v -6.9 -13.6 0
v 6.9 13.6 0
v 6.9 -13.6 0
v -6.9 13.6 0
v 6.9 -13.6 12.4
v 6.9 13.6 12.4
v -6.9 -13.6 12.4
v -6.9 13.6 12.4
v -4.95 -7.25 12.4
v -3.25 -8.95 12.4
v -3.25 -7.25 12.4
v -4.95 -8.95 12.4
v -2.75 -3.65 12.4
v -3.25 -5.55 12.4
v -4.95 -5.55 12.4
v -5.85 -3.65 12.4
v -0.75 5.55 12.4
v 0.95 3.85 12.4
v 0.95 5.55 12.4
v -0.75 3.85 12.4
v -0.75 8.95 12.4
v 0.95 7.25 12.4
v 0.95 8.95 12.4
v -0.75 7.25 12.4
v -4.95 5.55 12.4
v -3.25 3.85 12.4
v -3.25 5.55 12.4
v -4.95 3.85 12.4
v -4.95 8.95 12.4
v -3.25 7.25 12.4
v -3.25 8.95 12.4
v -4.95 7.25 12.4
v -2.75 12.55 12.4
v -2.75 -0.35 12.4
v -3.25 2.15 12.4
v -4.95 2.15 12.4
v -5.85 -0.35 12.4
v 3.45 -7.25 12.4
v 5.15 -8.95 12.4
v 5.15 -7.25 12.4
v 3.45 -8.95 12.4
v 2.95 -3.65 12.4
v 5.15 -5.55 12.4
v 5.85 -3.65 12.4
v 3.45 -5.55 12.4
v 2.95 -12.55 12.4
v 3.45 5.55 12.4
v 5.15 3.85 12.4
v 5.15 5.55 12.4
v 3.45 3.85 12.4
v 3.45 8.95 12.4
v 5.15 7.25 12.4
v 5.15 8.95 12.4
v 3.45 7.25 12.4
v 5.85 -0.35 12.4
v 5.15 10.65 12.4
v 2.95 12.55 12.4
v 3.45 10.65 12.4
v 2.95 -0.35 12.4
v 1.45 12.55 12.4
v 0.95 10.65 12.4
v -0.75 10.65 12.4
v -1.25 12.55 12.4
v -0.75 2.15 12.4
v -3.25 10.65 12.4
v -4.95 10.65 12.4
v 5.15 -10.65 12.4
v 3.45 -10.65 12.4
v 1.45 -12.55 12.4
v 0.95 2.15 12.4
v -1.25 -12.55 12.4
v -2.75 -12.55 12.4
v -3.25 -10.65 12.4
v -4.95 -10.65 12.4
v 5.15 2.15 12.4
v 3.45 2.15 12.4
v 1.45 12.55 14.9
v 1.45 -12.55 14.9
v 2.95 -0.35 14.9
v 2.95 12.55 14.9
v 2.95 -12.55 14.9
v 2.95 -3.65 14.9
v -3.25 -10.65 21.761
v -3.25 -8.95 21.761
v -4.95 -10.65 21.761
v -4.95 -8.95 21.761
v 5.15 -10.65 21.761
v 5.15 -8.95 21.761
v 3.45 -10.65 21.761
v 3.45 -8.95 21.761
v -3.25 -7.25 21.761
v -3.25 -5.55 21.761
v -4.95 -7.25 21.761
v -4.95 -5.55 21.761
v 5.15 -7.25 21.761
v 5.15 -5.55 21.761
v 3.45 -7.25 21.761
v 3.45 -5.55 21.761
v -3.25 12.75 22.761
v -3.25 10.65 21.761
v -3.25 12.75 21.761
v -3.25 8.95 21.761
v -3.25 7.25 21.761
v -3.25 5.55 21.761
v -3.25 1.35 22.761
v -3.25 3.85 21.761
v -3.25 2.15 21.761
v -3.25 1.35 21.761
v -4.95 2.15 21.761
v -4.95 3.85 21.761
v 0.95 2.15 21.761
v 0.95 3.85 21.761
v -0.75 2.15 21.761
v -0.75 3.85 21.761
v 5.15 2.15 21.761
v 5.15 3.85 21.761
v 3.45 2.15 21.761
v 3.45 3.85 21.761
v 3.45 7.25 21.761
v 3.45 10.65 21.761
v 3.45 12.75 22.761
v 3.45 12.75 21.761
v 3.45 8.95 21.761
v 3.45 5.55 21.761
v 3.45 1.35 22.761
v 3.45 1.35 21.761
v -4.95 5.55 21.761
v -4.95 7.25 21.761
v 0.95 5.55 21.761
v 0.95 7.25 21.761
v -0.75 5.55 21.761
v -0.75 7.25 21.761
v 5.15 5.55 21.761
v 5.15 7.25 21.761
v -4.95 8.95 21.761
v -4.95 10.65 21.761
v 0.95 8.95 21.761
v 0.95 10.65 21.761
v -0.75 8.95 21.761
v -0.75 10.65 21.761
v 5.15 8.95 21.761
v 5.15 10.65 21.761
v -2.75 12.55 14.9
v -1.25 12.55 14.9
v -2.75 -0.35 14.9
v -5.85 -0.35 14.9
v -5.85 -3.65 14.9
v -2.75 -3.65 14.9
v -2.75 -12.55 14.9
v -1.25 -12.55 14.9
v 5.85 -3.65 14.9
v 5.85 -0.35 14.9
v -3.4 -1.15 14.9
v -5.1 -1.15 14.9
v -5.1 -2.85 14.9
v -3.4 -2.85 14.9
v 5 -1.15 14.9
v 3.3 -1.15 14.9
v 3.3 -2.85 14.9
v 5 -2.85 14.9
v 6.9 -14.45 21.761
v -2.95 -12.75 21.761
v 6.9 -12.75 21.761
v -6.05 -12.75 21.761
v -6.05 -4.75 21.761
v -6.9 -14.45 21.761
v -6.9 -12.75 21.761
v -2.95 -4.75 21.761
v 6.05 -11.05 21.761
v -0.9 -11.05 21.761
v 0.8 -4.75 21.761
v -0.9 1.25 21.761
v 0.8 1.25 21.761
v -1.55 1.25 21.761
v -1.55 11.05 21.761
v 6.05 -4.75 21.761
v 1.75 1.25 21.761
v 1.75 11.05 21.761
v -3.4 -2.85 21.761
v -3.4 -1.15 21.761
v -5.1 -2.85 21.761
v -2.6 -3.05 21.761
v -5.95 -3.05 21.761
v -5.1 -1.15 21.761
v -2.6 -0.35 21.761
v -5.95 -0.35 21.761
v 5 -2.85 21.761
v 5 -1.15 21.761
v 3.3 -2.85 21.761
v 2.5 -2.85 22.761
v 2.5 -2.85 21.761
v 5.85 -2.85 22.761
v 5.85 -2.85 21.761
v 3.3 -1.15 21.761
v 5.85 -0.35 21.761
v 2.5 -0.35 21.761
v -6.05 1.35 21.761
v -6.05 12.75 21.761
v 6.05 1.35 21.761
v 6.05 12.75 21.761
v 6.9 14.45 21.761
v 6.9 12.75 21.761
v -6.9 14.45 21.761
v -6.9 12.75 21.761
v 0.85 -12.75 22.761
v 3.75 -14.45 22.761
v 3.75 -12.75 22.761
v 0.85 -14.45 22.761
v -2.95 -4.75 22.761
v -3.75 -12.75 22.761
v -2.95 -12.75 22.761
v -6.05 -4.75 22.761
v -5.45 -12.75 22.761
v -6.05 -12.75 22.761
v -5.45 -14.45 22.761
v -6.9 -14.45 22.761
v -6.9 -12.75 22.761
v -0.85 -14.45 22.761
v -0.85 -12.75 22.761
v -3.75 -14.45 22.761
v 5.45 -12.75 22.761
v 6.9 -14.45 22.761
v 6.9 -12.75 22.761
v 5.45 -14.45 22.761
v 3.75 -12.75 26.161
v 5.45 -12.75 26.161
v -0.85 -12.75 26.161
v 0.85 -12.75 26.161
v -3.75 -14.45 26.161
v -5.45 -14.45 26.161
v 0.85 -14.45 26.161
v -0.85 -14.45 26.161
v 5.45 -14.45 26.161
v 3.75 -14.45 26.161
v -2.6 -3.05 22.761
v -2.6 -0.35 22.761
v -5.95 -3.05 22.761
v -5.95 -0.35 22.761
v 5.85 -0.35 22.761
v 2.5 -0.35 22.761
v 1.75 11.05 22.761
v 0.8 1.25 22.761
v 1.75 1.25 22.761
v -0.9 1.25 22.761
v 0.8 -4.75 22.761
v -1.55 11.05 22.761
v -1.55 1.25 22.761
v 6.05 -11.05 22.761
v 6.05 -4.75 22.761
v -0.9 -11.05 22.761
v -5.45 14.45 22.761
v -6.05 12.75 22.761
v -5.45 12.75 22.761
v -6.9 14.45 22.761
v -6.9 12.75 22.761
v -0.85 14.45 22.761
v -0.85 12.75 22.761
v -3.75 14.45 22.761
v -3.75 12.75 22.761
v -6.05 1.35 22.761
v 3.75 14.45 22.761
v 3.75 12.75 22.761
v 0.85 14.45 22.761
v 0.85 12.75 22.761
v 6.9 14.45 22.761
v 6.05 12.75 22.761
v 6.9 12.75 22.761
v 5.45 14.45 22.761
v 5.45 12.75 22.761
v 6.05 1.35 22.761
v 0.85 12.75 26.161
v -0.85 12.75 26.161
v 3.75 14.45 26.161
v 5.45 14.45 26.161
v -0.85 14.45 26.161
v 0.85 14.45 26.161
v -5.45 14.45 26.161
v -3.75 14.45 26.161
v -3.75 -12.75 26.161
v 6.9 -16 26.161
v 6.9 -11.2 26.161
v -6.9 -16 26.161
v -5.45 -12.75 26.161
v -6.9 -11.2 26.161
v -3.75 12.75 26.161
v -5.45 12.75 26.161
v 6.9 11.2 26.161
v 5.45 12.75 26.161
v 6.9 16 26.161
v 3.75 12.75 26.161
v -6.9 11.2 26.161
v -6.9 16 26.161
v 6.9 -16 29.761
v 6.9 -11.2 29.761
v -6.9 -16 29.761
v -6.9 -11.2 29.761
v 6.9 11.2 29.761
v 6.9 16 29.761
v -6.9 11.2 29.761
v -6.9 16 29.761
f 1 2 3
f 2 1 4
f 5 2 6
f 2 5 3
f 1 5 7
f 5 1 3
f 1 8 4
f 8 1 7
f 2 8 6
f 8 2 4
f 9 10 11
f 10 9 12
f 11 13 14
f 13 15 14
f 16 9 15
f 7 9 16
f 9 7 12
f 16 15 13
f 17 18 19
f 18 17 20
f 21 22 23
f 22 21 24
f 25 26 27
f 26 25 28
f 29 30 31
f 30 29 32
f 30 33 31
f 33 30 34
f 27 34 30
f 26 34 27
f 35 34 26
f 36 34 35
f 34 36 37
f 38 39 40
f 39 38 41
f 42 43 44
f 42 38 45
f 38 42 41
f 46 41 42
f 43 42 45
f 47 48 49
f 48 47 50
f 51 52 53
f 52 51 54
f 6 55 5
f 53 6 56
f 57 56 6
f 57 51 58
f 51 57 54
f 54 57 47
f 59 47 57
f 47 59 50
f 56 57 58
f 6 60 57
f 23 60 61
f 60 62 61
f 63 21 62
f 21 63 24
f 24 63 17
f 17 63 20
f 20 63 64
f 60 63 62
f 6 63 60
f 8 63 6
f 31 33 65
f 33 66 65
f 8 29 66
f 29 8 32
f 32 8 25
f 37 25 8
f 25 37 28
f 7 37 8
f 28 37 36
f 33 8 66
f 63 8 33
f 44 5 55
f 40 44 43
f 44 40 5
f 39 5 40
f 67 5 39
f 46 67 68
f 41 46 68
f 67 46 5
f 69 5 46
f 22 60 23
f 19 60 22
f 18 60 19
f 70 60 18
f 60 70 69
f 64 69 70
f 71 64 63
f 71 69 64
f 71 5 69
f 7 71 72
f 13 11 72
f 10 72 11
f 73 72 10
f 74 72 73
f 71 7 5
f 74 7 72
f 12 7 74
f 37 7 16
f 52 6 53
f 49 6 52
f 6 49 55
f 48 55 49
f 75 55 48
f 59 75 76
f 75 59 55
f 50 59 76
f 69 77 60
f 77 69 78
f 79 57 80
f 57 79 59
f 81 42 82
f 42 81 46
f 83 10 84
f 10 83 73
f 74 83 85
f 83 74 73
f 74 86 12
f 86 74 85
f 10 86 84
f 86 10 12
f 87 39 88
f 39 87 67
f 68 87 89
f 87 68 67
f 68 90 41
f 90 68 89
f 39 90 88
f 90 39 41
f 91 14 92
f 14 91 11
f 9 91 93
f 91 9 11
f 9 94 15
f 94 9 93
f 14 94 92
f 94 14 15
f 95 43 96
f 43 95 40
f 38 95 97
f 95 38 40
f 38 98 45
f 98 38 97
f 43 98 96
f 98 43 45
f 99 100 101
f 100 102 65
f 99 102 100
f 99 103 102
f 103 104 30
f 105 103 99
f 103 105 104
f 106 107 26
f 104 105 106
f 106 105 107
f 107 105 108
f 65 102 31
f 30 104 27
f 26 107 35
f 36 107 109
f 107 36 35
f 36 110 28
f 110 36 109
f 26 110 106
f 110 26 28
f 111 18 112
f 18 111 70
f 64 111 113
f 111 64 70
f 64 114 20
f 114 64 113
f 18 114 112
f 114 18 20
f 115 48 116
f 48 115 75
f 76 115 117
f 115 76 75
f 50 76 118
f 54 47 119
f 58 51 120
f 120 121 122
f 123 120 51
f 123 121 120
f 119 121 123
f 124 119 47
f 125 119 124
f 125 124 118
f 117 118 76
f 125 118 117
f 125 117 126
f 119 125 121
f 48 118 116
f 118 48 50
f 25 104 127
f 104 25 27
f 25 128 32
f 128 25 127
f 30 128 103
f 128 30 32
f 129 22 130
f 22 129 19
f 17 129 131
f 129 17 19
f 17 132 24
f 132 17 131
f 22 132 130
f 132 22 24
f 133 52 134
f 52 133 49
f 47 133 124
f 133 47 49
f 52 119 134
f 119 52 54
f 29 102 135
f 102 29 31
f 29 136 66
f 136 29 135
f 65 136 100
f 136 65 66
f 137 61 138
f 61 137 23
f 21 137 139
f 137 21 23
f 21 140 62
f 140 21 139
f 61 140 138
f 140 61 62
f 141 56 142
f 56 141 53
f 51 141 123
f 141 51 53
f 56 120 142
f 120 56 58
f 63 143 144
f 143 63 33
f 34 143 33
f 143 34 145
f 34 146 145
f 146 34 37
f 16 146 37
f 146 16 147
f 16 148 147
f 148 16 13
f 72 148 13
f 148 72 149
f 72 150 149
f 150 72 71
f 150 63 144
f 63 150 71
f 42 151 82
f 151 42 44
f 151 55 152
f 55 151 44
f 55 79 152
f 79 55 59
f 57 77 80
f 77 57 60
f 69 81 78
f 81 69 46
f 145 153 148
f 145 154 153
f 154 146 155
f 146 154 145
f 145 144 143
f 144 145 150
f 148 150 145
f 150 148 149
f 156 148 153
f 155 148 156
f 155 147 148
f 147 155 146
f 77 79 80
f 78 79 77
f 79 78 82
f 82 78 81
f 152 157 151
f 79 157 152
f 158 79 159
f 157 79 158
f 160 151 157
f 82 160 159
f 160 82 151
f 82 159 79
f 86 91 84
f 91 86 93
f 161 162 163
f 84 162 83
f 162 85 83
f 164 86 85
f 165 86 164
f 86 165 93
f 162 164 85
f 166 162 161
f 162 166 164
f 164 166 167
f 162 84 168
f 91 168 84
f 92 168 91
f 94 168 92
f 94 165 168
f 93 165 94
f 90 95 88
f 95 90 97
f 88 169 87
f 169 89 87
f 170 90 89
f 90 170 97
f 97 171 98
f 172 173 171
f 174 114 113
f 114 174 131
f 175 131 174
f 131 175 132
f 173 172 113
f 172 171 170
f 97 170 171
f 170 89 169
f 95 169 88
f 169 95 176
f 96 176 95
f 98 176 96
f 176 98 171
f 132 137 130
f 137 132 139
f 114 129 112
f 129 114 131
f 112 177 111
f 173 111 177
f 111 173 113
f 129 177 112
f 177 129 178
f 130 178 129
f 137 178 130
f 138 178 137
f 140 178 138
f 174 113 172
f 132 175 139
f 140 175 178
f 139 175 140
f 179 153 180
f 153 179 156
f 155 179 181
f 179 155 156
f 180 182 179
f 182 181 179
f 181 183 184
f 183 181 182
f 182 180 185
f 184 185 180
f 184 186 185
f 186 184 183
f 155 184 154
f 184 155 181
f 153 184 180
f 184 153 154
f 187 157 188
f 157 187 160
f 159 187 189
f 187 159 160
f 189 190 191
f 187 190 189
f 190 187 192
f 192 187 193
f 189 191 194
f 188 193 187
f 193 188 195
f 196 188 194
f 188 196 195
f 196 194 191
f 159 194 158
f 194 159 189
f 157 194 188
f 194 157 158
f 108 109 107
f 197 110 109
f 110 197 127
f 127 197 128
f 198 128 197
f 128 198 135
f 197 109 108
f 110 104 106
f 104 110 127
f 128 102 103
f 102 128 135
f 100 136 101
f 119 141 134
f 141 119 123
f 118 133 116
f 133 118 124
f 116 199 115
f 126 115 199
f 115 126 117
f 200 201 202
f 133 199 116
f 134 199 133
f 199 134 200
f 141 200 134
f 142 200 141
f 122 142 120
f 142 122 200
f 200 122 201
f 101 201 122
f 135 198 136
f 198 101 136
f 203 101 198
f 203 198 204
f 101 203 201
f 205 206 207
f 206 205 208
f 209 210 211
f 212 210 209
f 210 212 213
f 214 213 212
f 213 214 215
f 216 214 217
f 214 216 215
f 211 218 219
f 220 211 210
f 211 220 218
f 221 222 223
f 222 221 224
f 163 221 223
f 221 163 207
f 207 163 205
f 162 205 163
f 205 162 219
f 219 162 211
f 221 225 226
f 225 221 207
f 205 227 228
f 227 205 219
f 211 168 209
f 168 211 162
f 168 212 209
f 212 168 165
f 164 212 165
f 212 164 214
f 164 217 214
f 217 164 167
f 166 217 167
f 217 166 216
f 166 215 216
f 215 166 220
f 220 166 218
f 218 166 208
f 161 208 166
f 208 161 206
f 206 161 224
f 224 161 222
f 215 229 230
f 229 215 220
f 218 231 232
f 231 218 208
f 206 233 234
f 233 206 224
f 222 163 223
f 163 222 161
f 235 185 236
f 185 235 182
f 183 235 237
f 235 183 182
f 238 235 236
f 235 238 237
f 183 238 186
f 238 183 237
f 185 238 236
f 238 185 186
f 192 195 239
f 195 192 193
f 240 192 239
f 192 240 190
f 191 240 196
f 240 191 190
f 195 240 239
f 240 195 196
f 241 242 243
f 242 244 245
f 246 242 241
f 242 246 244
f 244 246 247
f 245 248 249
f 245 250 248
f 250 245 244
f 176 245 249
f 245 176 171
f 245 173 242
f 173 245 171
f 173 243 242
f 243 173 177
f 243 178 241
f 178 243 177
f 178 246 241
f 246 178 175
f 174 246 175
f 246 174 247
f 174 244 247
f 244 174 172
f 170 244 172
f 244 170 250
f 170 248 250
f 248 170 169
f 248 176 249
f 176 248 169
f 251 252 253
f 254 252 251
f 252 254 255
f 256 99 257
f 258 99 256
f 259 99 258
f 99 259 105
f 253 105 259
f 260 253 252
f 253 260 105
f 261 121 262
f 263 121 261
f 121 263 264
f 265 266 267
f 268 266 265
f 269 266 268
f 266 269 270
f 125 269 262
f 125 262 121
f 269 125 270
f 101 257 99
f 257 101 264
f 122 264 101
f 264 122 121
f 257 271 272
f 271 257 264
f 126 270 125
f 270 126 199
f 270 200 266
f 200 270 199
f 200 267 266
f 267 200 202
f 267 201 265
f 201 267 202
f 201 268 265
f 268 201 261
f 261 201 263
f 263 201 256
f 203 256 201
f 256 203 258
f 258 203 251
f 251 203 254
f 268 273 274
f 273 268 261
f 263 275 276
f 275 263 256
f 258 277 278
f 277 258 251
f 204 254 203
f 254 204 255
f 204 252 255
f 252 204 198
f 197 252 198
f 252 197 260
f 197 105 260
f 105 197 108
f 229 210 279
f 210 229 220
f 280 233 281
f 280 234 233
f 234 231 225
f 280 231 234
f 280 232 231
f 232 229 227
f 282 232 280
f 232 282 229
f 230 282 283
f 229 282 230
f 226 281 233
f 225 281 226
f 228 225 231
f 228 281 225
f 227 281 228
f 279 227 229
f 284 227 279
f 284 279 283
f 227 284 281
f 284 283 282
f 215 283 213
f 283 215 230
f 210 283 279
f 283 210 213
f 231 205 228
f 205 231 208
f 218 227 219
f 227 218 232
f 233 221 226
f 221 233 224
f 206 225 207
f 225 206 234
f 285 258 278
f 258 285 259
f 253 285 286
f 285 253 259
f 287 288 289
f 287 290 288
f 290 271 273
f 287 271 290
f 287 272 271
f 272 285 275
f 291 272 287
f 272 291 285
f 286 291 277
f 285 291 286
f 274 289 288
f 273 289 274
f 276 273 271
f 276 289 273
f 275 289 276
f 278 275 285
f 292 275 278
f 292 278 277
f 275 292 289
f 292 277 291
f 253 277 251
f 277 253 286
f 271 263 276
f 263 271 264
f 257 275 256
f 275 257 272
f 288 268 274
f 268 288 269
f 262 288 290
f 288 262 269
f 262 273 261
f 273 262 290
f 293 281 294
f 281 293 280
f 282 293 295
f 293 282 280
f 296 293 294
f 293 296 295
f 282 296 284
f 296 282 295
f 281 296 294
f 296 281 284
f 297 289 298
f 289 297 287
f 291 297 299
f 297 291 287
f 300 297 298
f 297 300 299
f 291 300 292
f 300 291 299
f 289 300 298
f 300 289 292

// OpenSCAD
// Generated by SolidPython 0.4.2 on 2020-09-29 23:21:21
//!OpenSCAD

scale(v = 0.0100000000) {
	translate(v = [-690, -1360, 0]) {
		union() {
			color(c = [0.4000000000, 0.4000000000, 0.4000000000]) {
				translate(v = [0, 0, 0]) {
					linear_extrude(height = 1000.0000000000) {
						polygon(paths = [[0, 1, 2, 3]], points = [[0, 0], [0, 2720], [1380, 2720], [1380, 0]]);
					}
				}
			}
			color(c = [0.2000000000, 0.6000000000, 0.2000000000]) {
				translate(v = [0, 0, 1000.0000000000]) {
					linear_extrude(height = 120.0000000000) {
						polygon(paths = [[0, 1, 2, 3]], points = [[0, 1305], [0, 2720], [1380, 2720], [1380, 1305]]);
					}
				}
			}
			color(c = [0.4000000000, 0.4000000000, 0.4000000000]) {
				translate(v = [0, 0, 1000.0000000000]) {
					linear_extrude(height = 120.0000000000) {
						polygon(paths = [[0, 1, 2, 3]], points = [[0, 0], [0, 1305], [1380, 1305], [1380, 0]]);
					}
				}
			}
			color(c = [0.9000000000, 0.6000000000, 0.6000000000]) {
				translate(v = [0, 0, 1120.0000000000]) {
					linear_extrude(height = 120.0000000000) {
						polygon(paths = [[0, 1, 2, 3]], points = [[155, 1485], [155, 2485], [415, 2485], [415, 1485]]);
					}
				}
			}
			color(c = [0.9000000000, 0.6000000000, 0.6000000000]) {
				translate(v = [0, 0, 1120.0000000000]) {
					linear_extrude(height = 120.0000000000) {
						polygon(paths = [[0, 1, 2, 3]], points = [[565, 1485], [565, 2485], [835, 2485], [835, 1485]]);
					}
				}
			}
			color(c = [0.9000000000, 0.6000000000, 0.6000000000]) {
				translate(v = [0, 0, 1120.0000000000]) {
					linear_extrude(height = 120.0000000000) {
						polygon(paths = [[0, 1, 2, 3]], points = [[985, 1485], [985, 2485], [1245, 2485], [1245, 1485]]);
					}
				}
			}
			color(c = [0.9000000000, 0.6000000000, 0.9000000000]) {
				translate(v = [0, 0, 1120.0000000000]) {
					linear_extrude(height = 120.0000000000) {
						polygon(paths = [[0, 1, 2, 3]], points = [[155, 235], [155, 885], [415, 885], [415, 235]]);
					}
				}
			}
			color(c = [0.9000000000, 0.6000000000, 0.9000000000]) {
				translate(v = [0, 0, 1120.0000000000]) {
					linear_extrude(height = 120.0000000000) {
						polygon(paths = [[0, 1, 2, 3]], points = [[565, 235], [565, 885], [835, 885], [835, 235]]);
					}
				}
			}
			color(c = [0.9000000000, 0.6000000000, 0.9000000000]) {
				translate(v = [0, 0, 1120.0000000000]) {
					linear_extrude(height = 120.0000000000) {
						polygon(paths = [[0, 1, 2, 3]], points = [[985, 235], [985, 885], [1245, 885], [1245, 235]]);
					}
				}
			}
			color(c = [0.2000000000, 0.6000000000, 0.2000000000]) {
				translate(v = [0, 0, 1120.0000000000]) {
					linear_extrude(height = 120.0000000000) {
						difference() {
							polygon(paths = [[0, 1, 2, 3]], points = [[0, 1305], [0, 2720], [1380, 2720], [1380, 1305]]);
							polygon(paths = [[0, 1, 2, 3]], points = [[155, 1485], [415, 1485], [415, 2485], [155, 2485]]);
							polygon(paths = [[0, 1, 2, 3]], points = [[565, 1485], [835, 1485], [835, 2485], [565, 2485]]);
							polygon(paths = [[0, 1, 2, 3]], points = [[985, 1485], [1245, 1485], [1245, 2485], [985, 2485]]);
						}
					}
				}
			}
			color(c = [0.4000000000, 0.4000000000, 0.4000000000]) {
				translate(v = [0, 0, 1120.0000000000]) {
					linear_extrude(height = 120.0000000000) {
						difference() {
							polygon(paths = [[0, 1, 2, 3]], points = [[0, 0], [0, 1305], [1380, 1305], [1380, 0]]);
							polygon(paths = [[0, 1, 2, 3]], points = [[155, 235], [415, 235], [415, 885], [155, 885]]);
							polygon(paths = [[0, 1, 2, 3]], points = [[565, 235], [835, 235], [835, 885], [565, 885]]);
							polygon(paths = [[0, 1, 2, 3]], points = [[985, 235], [1245, 235], [1245, 885], [985, 885]]);
						}
					}
				}
			}
			color(c = [0.1000000000, 0.1000000000, 0.1000000000]) {
				translate(v = [0, 0, 1240.0000000000]) {
					linear_extrude(height = 70.0000000000) {
						polygon(paths = [[0, 1, 2, 3]], points = [[195, 295], [195, 465], [365, 465], [365, 295]]);
					}
				}
			}
			color(c = [0.1000000000, 0.1000000000, 0.1000000000]) {
				translate(v = [0, 0, 1240.0000000000]) {
					linear_extrude(height = 70.0000000000) {
						polygon(paths = [[0, 1, 2, 3]], points = [[1035, 295], [1035, 465], [1205, 465], [1205, 295]]);
					}
				}
			}
			color(c = [0.1000000000, 0.1000000000, 0.1000000000]) {
				translate(v = [0, 0, 1240.0000000000]) {
					linear_extrude(height = 70.0000000000) {
						polygon(paths = [[0, 1, 2, 3]], points = [[195, 635], [195, 805], [365, 805], [365, 635]]);
					}
				}
			}
			color(c = [0.1000000000, 0.1000000000, 0.1000000000]) {
				translate(v = [0, 0, 1240.0000000000]) {
					linear_extrude(height = 70.0000000000) {
						polygon(paths = [[0, 1, 2, 3]], points = [[1035, 635], [1035, 805], [1205, 805], [1205, 635]]);
					}
				}
			}
			color(c = [0.1000000000, 0.1000000000, 0.1000000000]) {
				translate(v = [0, 0, 1240.0000000000]) {
					linear_extrude(height = 70.0000000000) {
						polygon(paths = [[0, 1, 2, 3]], points = [[195, 1575], [195, 1745], [365, 1745], [365, 1575]]);
					}
				}
			}
			color(c = [0.1000000000, 0.1000000000, 0.1000000000]) {
				translate(v = [0, 0, 1240.0000000000]) {
					linear_extrude(height = 70.0000000000) {
						polygon(paths = [[0, 1, 2, 3]], points = [[615, 1575], [615, 1745], [785, 1745], [785, 1575]]);
					}
				}
			}
			color(c = [0.1000000000, 0.1000000000, 0.1000000000]) {
				translate(v = [0, 0, 1240.0000000000]) {
					linear_extrude(height = 70.0000000000) {
						polygon(paths = [[0, 1, 2, 3]], points = [[1035, 1575], [1035, 1745], [1205, 1745], [1205, 1575]]);
					}
				}
			}
			color(c = [0.1000000000, 0.1000000000, 0.1000000000]) {
				translate(v = [0, 0, 1240.0000000000]) {
					linear_extrude(height = 70.0000000000) {
						polygon(paths = [[0, 1, 2, 3]], points = [[195, 1915], [195, 2085], [365, 2085], [365, 1915]]);
					}
				}
			}
			color(c = [0.1000000000, 0.1000000000, 0.1000000000]) {
				translate(v = [0, 0, 1240.0000000000]) {
					linear_extrude(height = 70.0000000000) {
						polygon(paths = [[0, 1, 2, 3]], points = [[615, 1915], [615, 2085], [785, 2085], [785, 1915]]);
					}
				}
			}
			color(c = [0.1000000000, 0.1000000000, 0.1000000000]) {
				translate(v = [0, 0, 1240.0000000000]) {
					linear_extrude(height = 70.0000000000) {
						polygon(paths = [[0, 1, 2, 3]], points = [[1035, 1915], [1035, 2085], [1205, 2085], [1205, 1915]]);
					}
				}
			}
			color(c = [0.1000000000, 0.1000000000, 0.1000000000]) {
				translate(v = [0, 0, 1240.0000000000]) {
					linear_extrude(height = 70.0000000000) {
						polygon(paths = [[0, 1, 2, 3]], points = [[195, 2255], [195, 2425], [365, 2425], [365, 2255]]);
					}
				}
			}
			color(c = [0.1000000000, 0.1000000000, 0.1000000000]) {
				translate(v = [0, 0, 1240.0000000000]) {
					linear_extrude(height = 70.0000000000) {
						polygon(paths = [[0, 1, 2, 3]], points = [[615, 2255], [615, 2425], [785, 2425], [785, 2255]]);
					}
				}
			}
			color(c = [0.1000000000, 0.1000000000, 0.1000000000]) {
				translate(v = [0, 0, 1240.0000000000]) {
					linear_extrude(height = 70.0000000000) {
						polygon(paths = [[0, 1, 2, 3]], points = [[1035, 2255], [1035, 2425], [1205, 2425], [1205, 2255]]);
					}
				}
			}
			color(c = [1.0000000000, 1.0000000000, 1.0000000000]) {
				translate(v = [0, 0, 1240.0000000000]) {
					linear_extrude(height = 70.0000000000) {
						polygon(paths = [[0, 1, 2, 3, 4, 5, 6, 7]], points = [[415, 105], [415, 995], [105, 995], [105, 1325], [415, 1325], [415, 2615], [565, 2615], [565, 105]]);
					}
				}
			}
			color(c = [1.0000000000, 1.0000000000, 1.0000000000]) {
				translate(v = [0, 0, 1240.0000000000]) {
					linear_extrude(height = 70.0000000000) {
						polygon(paths = [[0, 1, 2, 3, 4, 5, 6, 7]], points = [[835, 105], [835, 2615], [985, 2615], [985, 1325], [1275, 1325], [1275, 995], [985, 995], [985, 105]]);
					}
				}
			}
			color(c = [0.1000000000, 0.1000000000, 0.1000000000]) {
				translate(v = [0, 0, 1310.0000000000]) {
					linear_extrude(height = 180.0000000000) {
						polygon(paths = [[0, 1, 2, 3]], points = [[195, 295], [195, 465], [365, 465], [365, 295]]);
					}
				}
			}
			color(c = [0.1000000000, 0.1000000000, 0.1000000000]) {
				translate(v = [0, 0, 1310.0000000000]) {
					linear_extrude(height = 180.0000000000) {
						polygon(paths = [[0, 1, 2, 3]], points = [[1035, 295], [1035, 465], [1205, 465], [1205, 295]]);
					}
				}
			}
			color(c = [0.1000000000, 0.1000000000, 0.1000000000]) {
				translate(v = [0, 0, 1310.0000000000]) {
					linear_extrude(height = 180.0000000000) {
						polygon(paths = [[0, 1, 2, 3]], points = [[195, 635], [195, 805], [365, 805], [365, 635]]);
					}
				}
			}
			color(c = [0.1000000000, 0.1000000000, 0.1000000000]) {
				translate(v = [0, 0, 1310.0000000000]) {
					linear_extrude(height = 180.0000000000) {
						polygon(paths = [[0, 1, 2, 3]], points = [[1035, 635], [1035, 805], [1205, 805], [1205, 635]]);
					}
				}
			}
			color(c = [0.1000000000, 0.1000000000, 0.1000000000]) {
				translate(v = [0, 0, 1310.0000000000]) {
					linear_extrude(height = 180.0000000000) {
						polygon(paths = [[0, 1, 2, 3]], points = [[195, 1575], [195, 1745], [365, 1745], [365, 1575]]);
					}
				}
			}
			color(c = [0.1000000000, 0.1000000000, 0.1000000000]) {
				translate(v = [0, 0, 1310.0000000000]) {
					linear_extrude(height = 180.0000000000) {
						polygon(paths = [[0, 1, 2, 3]], points = [[615, 1575], [615, 1745], [785, 1745], [785, 1575]]);
					}
				}
			}
			color(c = [0.1000000000, 0.1000000000, 0.1000000000]) {
				translate(v = [0, 0, 1310.0000000000]) {
					linear_extrude(height = 180.0000000000) {
						polygon(paths = [[0, 1, 2, 3]], points = [[1035, 1575], [1035, 1745], [1205, 1745], [1205, 1575]]);
					}
				}
			}
			color(c = [0.1000000000, 0.1000000000, 0.1000000000]) {
				translate(v = [0, 0, 1310.0000000000]) {
					linear_extrude(height = 180.0000000000) {
						polygon(paths = [[0, 1, 2, 3]], points = [[195, 1915], [195, 2085], [365, 2085], [365, 1915]]);
					}
				}
			}
			color(c = [0.1000000000, 0.1000000000, 0.1000000000]) {
				translate(v = [0, 0, 1310.0000000000]) {
					linear_extrude(height = 180.0000000000) {
						polygon(paths = [[0, 1, 2, 3]], points = [[615, 1915], [615, 2085], [785, 2085], [785, 1915]]);
					}
				}
			}
			color(c = [0.1000000000, 0.1000000000, 0.1000000000]) {
				translate(v = [0, 0, 1310.0000000000]) {
					linear_extrude(height = 180.0000000000) {
						polygon(paths = [[0, 1, 2, 3]], points = [[1035, 1915], [1035, 2085], [1205, 2085], [1205, 1915]]);
					}
				}
			}
			color(c = [0.1000000000, 0.1000000000, 0.1000000000]) {
				translate(v = [0, 0, 1310.0000000000]) {
					linear_extrude(height = 180.0000000000) {
						polygon(paths = [[0, 1, 2, 3]], points = [[195, 2255], [195, 2425], [365, 2425], [365, 2255]]);
					}
				}
			}
			color(c = [0.1000000000, 0.1000000000, 0.1000000000]) {
				translate(v = [0, 0, 1310.0000000000]) {
					linear_extrude(height = 180.0000000000) {
						polygon(paths = [[0, 1, 2, 3]], points = [[615, 2255], [615, 2425], [785, 2425], [785, 2255]]);
					}
				}
			}
			color(c = [0.1000000000, 0.1000000000, 0.1000000000]) {
				translate(v = [0, 0, 1310.0000000000]) {
					linear_extrude(height = 180.0000000000) {
						polygon(paths = [[0, 1, 2, 3]], points = [[1035, 2255], [1035, 2425], [1205, 2425], [1205, 2255]]);
					}
				}
			}
			color(c = [0.7000000000, 0, 0]) {
				translate(v = [0, 0, 1310.0000000000]) {
					linear_extrude(height = 180.0000000000) {
						polygon(paths = [[0, 1, 2, 3, 4, 5, 6, 7]], points = [[415, 105], [415, 995], [105, 995], [105, 1325], [415, 1325], [415, 2615], [565, 2615], [565, 105]]);
					}
				}
			}
			color(c = [0.7000000000, 0, 0]) {
				translate(v = [0, 0, 1310.0000000000]) {
					linear_extrude(height = 180.0000000000) {
						polygon(paths = [[0, 1, 2, 3, 4, 5, 6, 7]], points = [[835, 105], [835, 2615], [985, 2615], [985, 1325], [1275, 1325], [1275, 995], [985, 995], [985, 105]]);
					}
				}
			}
			color(c = [0.1000000000, 0.1000000000, 0.1000000000]) {
				translate(v = [0, 0, 1490.0000000000]) {
					linear_extrude(height = 686.1000000000) {
						polygon(paths = [[0, 1, 2, 3]], points = [[195, 295], [195, 465], [365, 465], [365, 295]]);
					}
				}
			}
			color(c = [0.1000000000, 0.1000000000, 0.1000000000]) {
				translate(v = [0, 0, 1490.0000000000]) {
					linear_extrude(height = 686.1000000000) {
						polygon(paths = [[0, 1, 2, 3]], points = [[1035, 295], [1035, 465], [1205, 465], [1205, 295]]);
					}
				}
			}
			color(c = [0.1000000000, 0.1000000000, 0.1000000000]) {
				translate(v = [0, 0, 1490.0000000000]) {
					linear_extrude(height = 686.1000000000) {
						polygon(paths = [[0, 1, 2, 3]], points = [[195, 635], [195, 805], [365, 805], [365, 635]]);
					}
				}
			}
			color(c = [0.1000000000, 0.1000000000, 0.1000000000]) {
				translate(v = [0, 0, 1490.0000000000]) {
					linear_extrude(height = 686.1000000000) {
						polygon(paths = [[0, 1, 2, 3]], points = [[1035, 635], [1035, 805], [1205, 805], [1205, 635]]);
					}
				}
			}
			color(c = [0.1000000000, 0.1000000000, 0.1000000000]) {
				translate(v = [0, 0, 1490.0000000000]) {
					linear_extrude(height = 686.1000000000) {
						polygon(paths = [[0, 1, 2, 3]], points = [[180, 1075], [180, 1245], [350, 1245], [350, 1075]]);
					}
				}
			}
			color(c = [0.1000000000, 0.1000000000, 0.1000000000]) {
				translate(v = [0, 0, 1490.0000000000]) {
					linear_extrude(height = 686.1000000000) {
						polygon(paths = [[0, 1, 2, 3]], points = [[1020, 1075], [1020, 1245], [1190, 1245], [1190, 1075]]);
					}
				}
			}
			color(c = [0.1000000000, 0.1000000000, 0.1000000000]) {
				translate(v = [0, 0, 1490.0000000000]) {
					linear_extrude(height = 686.1000000000) {
						polygon(paths = [[0, 1, 2, 3]], points = [[195, 1575], [195, 1745], [365, 1745], [365, 1575]]);
					}
				}
			}
			color(c = [0.1000000000, 0.1000000000, 0.1000000000]) {
				translate(v = [0, 0, 1490.0000000000]) {
					linear_extrude(height = 686.1000000000) {
						polygon(paths = [[0, 1, 2, 3]], points = [[615, 1575], [615, 1745], [785, 1745], [785, 1575]]);
					}
				}
			}
			color(c = [0.1000000000, 0.1000000000, 0.1000000000]) {
				translate(v = [0, 0, 1490.0000000000]) {
					linear_extrude(height = 686.1000000000) {
						polygon(paths = [[0, 1, 2, 3]], points = [[1035, 1575], [1035, 1745], [1205, 1745], [1205, 1575]]);
					}
				}
			}
			color(c = [0.1000000000, 0.1000000000, 0.1000000000]) {
				translate(v = [0, 0, 1490.0000000000]) {
					linear_extrude(height = 686.1000000000) {
						polygon(paths = [[0, 1, 2, 3]], points = [[195, 1915], [195, 2085], [365, 2085], [365, 1915]]);
					}
				}
			}
			color(c = [0.1000000000, 0.1000000000, 0.1000000000]) {
				translate(v = [0, 0, 1490.0000000000]) {
					linear_extrude(height = 686.1000000000) {
						polygon(paths = [[0, 1, 2, 3]], points = [[615, 1915], [615, 2085], [785, 2085], [785, 1915]]);
					}
				}
			}
			color(c = [0.1000000000, 0.1000000000, 0.1000000000]) {
				translate(v = [0, 0, 1490.0000000000]) {
					linear_extrude(height = 686.1000000000) {
						polygon(paths = [[0, 1, 2, 3]], points = [[1035, 1915], [1035, 2085], [1205, 2085], [1205, 1915]]);
					}
				}
			}
			color(c = [0.1000000000, 0.1000000000, 0.1000000000]) {
				translate(v = [0, 0, 1490.0000000000]) {
					linear_extrude(height = 686.1000000000) {
						polygon(paths = [[0, 1, 2, 3]], points = [[195, 2255], [195, 2425], [365, 2425], [365, 2255]]);
					}
				}
			}
			color(c = [0.1000000000, 0.1000000000, 0.1000000000]) {
				translate(v = [0, 0, 1490.0000000000]) {
					linear_extrude(height = 686.1000000000) {
						polygon(paths = [[0, 1, 2, 3]], points = [[615, 2255], [615, 2425], [785, 2425], [785, 2255]]);
					}
				}
			}
			color(c = [0.1000000000, 0.1000000000, 0.1000000000]) {
				translate(v = [0, 0, 1490.0000000000]) {
					linear_extrude(height = 686.1000000000) {
						polygon(paths = [[0, 1, 2, 3]], points = [[1035, 2255], [1035, 2425], [1205, 2425], [1205, 2255]]);
					}
				}
			}
			color(c = [0.9000000000, 0.6000000000, 0.6000000000]) {
				translate(v = [0, 0, 2176.1000000000]) {
					linear_extrude(height = 100.0000000000) {
						polygon(paths = [[0, 1, 2, 3, 4, 5, 6, 7]], points = [[0, -85], [0, 85], [85, 85], [85, 885], [395, 885], [395, 85], [1380, 85], [1380, -85]]);
					}
				}
			}
			color(c = [0.9000000000, 0.6000000000, 0.6000000000]) {
				translate(v = [0, 0, 2176.1000000000]) {
					linear_extrude(height = 100.0000000000) {
						polygon(paths = [[0, 1, 2, 3]], points = [[95, 1055], [95, 1325], [430, 1325], [430, 1055]]);
					}
				}
			}
			color(c = [0.9000000000, 0.6000000000, 0.6000000000]) {
				translate(v = [0, 0, 2176.1000000000]) {
					linear_extrude(height = 100.0000000000) {
						polygon(paths = [[0, 1, 2, 3]], points = [[940, 1075], [940, 1325], [1275, 1325], [1275, 1075]]);
					}
				}
			}
			color(c = [0.9000000000, 0.6000000000, 0.6000000000]) {
				translate(v = [0, 0, 2176.1000000000]) {
					linear_extrude(height = 100.0000000000) {
						polygon(paths = [[0, 1, 2, 3, 4, 5, 6, 7, 8, 9]], points = [[600, 255], [600, 1485], [535, 1485], [535, 2465], [865, 2465], [865, 1485], [770, 1485], [770, 885], [1295, 885], [1295, 255]]);
					}
				}
			}
			color(c = [0.9000000000, 0.6000000000, 0.6000000000]) {
				translate(v = [0, 0, 2176.1000000000]) {
					linear_extrude(height = 100.0000000000) {
						polygon(paths = [[0, 1, 2, 3, 4, 5, 6, 7, 8, 9, 10, 11]], points = [[85, 1495], [85, 2635], [0, 2635], [0, 2805], [1380, 2805], [1380, 2635], [1295, 2635], [1295, 1495], [1035, 1495], [1035, 2635], [365, 2635], [365, 1495]]);
					}
				}
			}
			color(c = [0.5000000000, 0.5000000000, 0.5000000000]) {
				translate(v = [0, 0, 2276.1000000000]) {
					linear_extrude(height = 340.0000000000) {
						polygon(paths = [[0, 1, 2, 3]], points = [[145, -85], [145, 85], [315, 85], [315, -85]]);
					}
				}
			}
			color(c = [0.5000000000, 0.5000000000, 0.5000000000]) {
				translate(v = [0, 0, 2276.1000000000]) {
					linear_extrude(height = 340.0000000000) {
						polygon(paths = [[0, 1, 2, 3]], points = [[605, -85], [605, 85], [775, 85], [775, -85]]);
					}
				}
			}
			color(c = [0.5000000000, 0.5000000000, 0.5000000000]) {
				translate(v = [0, 0, 2276.1000000000]) {
					linear_extrude(height = 340.0000000000) {
						polygon(paths = [[0, 1, 2, 3]], points = [[1065, -85], [1065, 85], [1235, 85], [1235, -85]]);
					}
				}
			}
			color(c = [0.5000000000, 0.5000000000, 0.5000000000]) {
				translate(v = [0, 0, 2276.1000000000]) {
					linear_extrude(height = 340.0000000000) {
						polygon(paths = [[0, 1, 2, 3]], points = [[145, 2635], [145, 2805], [315, 2805], [315, 2635]]);
					}
				}
			}
			color(c = [0.5000000000, 0.5000000000, 0.5000000000]) {
				translate(v = [0, 0, 2276.1000000000]) {
					linear_extrude(height = 340.0000000000) {
						polygon(paths = [[0, 1, 2, 3]], points = [[605, 2635], [605, 2805], [775, 2805], [775, 2635]]);
					}
				}
			}
			color(c = [0.5000000000, 0.5000000000, 0.5000000000]) {
				translate(v = [0, 0, 2276.1000000000]) {
					linear_extrude(height = 340.0000000000) {
						polygon(paths = [[0, 1, 2, 3]], points = [[1065, 2635], [1065, 2805], [1235, 2805], [1235, 2635]]);
					}
				}
			}
			color(c = [0.3000000000, 0.3000000000, 1]) {
				translate(v = [0, 0, 2616.1000000000]) {
					linear_extrude(height = 360.0000000000) {
						polygon(paths = [[0, 1, 2, 3]], points = [[0, -240], [0, 240], [1380, 240], [1380, -240]]);
					}
				}
			}
			color(c = [0.3000000000, 0.3000000000, 1]) {
				translate(v = [0, 0, 2616.1000000000]) {
					linear_extrude(height = 360.0000000000) {
						polygon(paths = [[0, 1, 2, 3]], points = [[0, 2480], [0, 2960], [1380, 2960], [1380, 2480]]);
					}
				}
			}
		}
	}
}
